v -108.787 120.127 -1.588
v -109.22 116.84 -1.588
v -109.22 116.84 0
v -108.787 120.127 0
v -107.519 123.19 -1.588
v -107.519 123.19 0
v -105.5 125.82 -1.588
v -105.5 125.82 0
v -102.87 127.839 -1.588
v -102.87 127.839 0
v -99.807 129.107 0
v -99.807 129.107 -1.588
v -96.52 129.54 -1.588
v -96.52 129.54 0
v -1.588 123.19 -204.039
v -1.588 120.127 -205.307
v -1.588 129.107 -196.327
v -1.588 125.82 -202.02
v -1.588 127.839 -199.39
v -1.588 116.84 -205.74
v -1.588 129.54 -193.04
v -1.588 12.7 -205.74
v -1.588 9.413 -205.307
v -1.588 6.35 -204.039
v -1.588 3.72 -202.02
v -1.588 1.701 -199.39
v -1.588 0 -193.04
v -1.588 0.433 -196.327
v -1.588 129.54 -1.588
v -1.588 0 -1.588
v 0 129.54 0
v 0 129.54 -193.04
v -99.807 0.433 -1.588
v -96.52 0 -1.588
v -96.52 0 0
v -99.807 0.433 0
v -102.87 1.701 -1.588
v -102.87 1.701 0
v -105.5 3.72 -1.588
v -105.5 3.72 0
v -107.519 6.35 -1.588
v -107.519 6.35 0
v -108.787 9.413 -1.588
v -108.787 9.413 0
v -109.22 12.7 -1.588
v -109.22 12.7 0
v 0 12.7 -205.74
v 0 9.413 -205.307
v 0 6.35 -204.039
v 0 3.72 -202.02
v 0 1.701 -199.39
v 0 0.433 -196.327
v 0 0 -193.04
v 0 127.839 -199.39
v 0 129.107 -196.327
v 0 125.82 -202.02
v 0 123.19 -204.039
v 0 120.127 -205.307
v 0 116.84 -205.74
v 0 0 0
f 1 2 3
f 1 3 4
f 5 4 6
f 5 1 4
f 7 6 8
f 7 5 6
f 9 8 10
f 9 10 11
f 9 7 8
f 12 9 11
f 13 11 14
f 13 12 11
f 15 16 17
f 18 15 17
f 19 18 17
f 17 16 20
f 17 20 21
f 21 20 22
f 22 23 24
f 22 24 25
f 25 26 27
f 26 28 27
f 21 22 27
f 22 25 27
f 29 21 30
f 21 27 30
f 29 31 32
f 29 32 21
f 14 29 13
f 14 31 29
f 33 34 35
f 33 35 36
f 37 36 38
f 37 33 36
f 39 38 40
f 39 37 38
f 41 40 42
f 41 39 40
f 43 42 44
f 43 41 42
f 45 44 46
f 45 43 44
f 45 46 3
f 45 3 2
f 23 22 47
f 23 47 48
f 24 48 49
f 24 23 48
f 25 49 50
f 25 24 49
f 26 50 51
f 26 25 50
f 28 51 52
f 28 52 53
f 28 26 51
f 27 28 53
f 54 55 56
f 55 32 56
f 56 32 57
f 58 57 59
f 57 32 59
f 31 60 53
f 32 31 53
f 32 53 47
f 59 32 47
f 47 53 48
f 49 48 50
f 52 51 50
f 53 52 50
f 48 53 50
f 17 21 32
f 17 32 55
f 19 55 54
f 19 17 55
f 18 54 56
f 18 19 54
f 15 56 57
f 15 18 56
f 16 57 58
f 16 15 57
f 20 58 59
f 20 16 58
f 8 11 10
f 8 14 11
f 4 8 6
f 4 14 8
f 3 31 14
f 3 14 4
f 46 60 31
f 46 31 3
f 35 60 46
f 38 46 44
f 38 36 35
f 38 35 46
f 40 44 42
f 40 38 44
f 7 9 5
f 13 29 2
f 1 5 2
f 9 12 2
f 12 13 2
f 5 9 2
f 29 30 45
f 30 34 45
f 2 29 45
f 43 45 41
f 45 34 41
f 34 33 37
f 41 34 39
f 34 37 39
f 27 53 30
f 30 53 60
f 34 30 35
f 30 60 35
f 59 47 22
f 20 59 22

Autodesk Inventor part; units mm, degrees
ref_plane "YZ Plane" through (0, 0, 0) normal (1, 0, 0) x (0, 1, 0)
ref_plane "XZ Plane" through (0, 0, 0) normal (0, 1, 0) x (-1, 0, 0)
ref_plane "XY Plane" through (0, 0, 0) normal (0, 0, 1) x (1, 0, 0)
sketch "Sketch1" plane through (0, 0, 0) normal (0, 1, 0) x (-1, 0, 0)
  line L0 (0, 0) -> (0, -205.74)
  line L1 (0, 0) -> (109.22, 0)
  line L2 (1.5875, -205.74) -> (1.5875, -1.5875)
  line L3 (1.5875, -1.5875) -> (109.22, -1.5875)
  line L4 (109.22, 0) -> (109.22, -1.5875)
  line L5 (0, -205.74) -> (1.5875, -205.74)
  dimension "d0" = 205.74
  dimension "d1" = 109.22
  dimension "d2" = 1.5875
extrude "Extrusion1" add sketch "Sketch1" along normal blind 129.54
fillet "Fillet1" radius 12.7 4 edges at (-0.7938, 129.54, -205.74) (-0.7938, 0, -205.74) (-109.22, 129.54, -0.7937) (-109.22, 0, -0.7937)
properties part number "book_stand"
